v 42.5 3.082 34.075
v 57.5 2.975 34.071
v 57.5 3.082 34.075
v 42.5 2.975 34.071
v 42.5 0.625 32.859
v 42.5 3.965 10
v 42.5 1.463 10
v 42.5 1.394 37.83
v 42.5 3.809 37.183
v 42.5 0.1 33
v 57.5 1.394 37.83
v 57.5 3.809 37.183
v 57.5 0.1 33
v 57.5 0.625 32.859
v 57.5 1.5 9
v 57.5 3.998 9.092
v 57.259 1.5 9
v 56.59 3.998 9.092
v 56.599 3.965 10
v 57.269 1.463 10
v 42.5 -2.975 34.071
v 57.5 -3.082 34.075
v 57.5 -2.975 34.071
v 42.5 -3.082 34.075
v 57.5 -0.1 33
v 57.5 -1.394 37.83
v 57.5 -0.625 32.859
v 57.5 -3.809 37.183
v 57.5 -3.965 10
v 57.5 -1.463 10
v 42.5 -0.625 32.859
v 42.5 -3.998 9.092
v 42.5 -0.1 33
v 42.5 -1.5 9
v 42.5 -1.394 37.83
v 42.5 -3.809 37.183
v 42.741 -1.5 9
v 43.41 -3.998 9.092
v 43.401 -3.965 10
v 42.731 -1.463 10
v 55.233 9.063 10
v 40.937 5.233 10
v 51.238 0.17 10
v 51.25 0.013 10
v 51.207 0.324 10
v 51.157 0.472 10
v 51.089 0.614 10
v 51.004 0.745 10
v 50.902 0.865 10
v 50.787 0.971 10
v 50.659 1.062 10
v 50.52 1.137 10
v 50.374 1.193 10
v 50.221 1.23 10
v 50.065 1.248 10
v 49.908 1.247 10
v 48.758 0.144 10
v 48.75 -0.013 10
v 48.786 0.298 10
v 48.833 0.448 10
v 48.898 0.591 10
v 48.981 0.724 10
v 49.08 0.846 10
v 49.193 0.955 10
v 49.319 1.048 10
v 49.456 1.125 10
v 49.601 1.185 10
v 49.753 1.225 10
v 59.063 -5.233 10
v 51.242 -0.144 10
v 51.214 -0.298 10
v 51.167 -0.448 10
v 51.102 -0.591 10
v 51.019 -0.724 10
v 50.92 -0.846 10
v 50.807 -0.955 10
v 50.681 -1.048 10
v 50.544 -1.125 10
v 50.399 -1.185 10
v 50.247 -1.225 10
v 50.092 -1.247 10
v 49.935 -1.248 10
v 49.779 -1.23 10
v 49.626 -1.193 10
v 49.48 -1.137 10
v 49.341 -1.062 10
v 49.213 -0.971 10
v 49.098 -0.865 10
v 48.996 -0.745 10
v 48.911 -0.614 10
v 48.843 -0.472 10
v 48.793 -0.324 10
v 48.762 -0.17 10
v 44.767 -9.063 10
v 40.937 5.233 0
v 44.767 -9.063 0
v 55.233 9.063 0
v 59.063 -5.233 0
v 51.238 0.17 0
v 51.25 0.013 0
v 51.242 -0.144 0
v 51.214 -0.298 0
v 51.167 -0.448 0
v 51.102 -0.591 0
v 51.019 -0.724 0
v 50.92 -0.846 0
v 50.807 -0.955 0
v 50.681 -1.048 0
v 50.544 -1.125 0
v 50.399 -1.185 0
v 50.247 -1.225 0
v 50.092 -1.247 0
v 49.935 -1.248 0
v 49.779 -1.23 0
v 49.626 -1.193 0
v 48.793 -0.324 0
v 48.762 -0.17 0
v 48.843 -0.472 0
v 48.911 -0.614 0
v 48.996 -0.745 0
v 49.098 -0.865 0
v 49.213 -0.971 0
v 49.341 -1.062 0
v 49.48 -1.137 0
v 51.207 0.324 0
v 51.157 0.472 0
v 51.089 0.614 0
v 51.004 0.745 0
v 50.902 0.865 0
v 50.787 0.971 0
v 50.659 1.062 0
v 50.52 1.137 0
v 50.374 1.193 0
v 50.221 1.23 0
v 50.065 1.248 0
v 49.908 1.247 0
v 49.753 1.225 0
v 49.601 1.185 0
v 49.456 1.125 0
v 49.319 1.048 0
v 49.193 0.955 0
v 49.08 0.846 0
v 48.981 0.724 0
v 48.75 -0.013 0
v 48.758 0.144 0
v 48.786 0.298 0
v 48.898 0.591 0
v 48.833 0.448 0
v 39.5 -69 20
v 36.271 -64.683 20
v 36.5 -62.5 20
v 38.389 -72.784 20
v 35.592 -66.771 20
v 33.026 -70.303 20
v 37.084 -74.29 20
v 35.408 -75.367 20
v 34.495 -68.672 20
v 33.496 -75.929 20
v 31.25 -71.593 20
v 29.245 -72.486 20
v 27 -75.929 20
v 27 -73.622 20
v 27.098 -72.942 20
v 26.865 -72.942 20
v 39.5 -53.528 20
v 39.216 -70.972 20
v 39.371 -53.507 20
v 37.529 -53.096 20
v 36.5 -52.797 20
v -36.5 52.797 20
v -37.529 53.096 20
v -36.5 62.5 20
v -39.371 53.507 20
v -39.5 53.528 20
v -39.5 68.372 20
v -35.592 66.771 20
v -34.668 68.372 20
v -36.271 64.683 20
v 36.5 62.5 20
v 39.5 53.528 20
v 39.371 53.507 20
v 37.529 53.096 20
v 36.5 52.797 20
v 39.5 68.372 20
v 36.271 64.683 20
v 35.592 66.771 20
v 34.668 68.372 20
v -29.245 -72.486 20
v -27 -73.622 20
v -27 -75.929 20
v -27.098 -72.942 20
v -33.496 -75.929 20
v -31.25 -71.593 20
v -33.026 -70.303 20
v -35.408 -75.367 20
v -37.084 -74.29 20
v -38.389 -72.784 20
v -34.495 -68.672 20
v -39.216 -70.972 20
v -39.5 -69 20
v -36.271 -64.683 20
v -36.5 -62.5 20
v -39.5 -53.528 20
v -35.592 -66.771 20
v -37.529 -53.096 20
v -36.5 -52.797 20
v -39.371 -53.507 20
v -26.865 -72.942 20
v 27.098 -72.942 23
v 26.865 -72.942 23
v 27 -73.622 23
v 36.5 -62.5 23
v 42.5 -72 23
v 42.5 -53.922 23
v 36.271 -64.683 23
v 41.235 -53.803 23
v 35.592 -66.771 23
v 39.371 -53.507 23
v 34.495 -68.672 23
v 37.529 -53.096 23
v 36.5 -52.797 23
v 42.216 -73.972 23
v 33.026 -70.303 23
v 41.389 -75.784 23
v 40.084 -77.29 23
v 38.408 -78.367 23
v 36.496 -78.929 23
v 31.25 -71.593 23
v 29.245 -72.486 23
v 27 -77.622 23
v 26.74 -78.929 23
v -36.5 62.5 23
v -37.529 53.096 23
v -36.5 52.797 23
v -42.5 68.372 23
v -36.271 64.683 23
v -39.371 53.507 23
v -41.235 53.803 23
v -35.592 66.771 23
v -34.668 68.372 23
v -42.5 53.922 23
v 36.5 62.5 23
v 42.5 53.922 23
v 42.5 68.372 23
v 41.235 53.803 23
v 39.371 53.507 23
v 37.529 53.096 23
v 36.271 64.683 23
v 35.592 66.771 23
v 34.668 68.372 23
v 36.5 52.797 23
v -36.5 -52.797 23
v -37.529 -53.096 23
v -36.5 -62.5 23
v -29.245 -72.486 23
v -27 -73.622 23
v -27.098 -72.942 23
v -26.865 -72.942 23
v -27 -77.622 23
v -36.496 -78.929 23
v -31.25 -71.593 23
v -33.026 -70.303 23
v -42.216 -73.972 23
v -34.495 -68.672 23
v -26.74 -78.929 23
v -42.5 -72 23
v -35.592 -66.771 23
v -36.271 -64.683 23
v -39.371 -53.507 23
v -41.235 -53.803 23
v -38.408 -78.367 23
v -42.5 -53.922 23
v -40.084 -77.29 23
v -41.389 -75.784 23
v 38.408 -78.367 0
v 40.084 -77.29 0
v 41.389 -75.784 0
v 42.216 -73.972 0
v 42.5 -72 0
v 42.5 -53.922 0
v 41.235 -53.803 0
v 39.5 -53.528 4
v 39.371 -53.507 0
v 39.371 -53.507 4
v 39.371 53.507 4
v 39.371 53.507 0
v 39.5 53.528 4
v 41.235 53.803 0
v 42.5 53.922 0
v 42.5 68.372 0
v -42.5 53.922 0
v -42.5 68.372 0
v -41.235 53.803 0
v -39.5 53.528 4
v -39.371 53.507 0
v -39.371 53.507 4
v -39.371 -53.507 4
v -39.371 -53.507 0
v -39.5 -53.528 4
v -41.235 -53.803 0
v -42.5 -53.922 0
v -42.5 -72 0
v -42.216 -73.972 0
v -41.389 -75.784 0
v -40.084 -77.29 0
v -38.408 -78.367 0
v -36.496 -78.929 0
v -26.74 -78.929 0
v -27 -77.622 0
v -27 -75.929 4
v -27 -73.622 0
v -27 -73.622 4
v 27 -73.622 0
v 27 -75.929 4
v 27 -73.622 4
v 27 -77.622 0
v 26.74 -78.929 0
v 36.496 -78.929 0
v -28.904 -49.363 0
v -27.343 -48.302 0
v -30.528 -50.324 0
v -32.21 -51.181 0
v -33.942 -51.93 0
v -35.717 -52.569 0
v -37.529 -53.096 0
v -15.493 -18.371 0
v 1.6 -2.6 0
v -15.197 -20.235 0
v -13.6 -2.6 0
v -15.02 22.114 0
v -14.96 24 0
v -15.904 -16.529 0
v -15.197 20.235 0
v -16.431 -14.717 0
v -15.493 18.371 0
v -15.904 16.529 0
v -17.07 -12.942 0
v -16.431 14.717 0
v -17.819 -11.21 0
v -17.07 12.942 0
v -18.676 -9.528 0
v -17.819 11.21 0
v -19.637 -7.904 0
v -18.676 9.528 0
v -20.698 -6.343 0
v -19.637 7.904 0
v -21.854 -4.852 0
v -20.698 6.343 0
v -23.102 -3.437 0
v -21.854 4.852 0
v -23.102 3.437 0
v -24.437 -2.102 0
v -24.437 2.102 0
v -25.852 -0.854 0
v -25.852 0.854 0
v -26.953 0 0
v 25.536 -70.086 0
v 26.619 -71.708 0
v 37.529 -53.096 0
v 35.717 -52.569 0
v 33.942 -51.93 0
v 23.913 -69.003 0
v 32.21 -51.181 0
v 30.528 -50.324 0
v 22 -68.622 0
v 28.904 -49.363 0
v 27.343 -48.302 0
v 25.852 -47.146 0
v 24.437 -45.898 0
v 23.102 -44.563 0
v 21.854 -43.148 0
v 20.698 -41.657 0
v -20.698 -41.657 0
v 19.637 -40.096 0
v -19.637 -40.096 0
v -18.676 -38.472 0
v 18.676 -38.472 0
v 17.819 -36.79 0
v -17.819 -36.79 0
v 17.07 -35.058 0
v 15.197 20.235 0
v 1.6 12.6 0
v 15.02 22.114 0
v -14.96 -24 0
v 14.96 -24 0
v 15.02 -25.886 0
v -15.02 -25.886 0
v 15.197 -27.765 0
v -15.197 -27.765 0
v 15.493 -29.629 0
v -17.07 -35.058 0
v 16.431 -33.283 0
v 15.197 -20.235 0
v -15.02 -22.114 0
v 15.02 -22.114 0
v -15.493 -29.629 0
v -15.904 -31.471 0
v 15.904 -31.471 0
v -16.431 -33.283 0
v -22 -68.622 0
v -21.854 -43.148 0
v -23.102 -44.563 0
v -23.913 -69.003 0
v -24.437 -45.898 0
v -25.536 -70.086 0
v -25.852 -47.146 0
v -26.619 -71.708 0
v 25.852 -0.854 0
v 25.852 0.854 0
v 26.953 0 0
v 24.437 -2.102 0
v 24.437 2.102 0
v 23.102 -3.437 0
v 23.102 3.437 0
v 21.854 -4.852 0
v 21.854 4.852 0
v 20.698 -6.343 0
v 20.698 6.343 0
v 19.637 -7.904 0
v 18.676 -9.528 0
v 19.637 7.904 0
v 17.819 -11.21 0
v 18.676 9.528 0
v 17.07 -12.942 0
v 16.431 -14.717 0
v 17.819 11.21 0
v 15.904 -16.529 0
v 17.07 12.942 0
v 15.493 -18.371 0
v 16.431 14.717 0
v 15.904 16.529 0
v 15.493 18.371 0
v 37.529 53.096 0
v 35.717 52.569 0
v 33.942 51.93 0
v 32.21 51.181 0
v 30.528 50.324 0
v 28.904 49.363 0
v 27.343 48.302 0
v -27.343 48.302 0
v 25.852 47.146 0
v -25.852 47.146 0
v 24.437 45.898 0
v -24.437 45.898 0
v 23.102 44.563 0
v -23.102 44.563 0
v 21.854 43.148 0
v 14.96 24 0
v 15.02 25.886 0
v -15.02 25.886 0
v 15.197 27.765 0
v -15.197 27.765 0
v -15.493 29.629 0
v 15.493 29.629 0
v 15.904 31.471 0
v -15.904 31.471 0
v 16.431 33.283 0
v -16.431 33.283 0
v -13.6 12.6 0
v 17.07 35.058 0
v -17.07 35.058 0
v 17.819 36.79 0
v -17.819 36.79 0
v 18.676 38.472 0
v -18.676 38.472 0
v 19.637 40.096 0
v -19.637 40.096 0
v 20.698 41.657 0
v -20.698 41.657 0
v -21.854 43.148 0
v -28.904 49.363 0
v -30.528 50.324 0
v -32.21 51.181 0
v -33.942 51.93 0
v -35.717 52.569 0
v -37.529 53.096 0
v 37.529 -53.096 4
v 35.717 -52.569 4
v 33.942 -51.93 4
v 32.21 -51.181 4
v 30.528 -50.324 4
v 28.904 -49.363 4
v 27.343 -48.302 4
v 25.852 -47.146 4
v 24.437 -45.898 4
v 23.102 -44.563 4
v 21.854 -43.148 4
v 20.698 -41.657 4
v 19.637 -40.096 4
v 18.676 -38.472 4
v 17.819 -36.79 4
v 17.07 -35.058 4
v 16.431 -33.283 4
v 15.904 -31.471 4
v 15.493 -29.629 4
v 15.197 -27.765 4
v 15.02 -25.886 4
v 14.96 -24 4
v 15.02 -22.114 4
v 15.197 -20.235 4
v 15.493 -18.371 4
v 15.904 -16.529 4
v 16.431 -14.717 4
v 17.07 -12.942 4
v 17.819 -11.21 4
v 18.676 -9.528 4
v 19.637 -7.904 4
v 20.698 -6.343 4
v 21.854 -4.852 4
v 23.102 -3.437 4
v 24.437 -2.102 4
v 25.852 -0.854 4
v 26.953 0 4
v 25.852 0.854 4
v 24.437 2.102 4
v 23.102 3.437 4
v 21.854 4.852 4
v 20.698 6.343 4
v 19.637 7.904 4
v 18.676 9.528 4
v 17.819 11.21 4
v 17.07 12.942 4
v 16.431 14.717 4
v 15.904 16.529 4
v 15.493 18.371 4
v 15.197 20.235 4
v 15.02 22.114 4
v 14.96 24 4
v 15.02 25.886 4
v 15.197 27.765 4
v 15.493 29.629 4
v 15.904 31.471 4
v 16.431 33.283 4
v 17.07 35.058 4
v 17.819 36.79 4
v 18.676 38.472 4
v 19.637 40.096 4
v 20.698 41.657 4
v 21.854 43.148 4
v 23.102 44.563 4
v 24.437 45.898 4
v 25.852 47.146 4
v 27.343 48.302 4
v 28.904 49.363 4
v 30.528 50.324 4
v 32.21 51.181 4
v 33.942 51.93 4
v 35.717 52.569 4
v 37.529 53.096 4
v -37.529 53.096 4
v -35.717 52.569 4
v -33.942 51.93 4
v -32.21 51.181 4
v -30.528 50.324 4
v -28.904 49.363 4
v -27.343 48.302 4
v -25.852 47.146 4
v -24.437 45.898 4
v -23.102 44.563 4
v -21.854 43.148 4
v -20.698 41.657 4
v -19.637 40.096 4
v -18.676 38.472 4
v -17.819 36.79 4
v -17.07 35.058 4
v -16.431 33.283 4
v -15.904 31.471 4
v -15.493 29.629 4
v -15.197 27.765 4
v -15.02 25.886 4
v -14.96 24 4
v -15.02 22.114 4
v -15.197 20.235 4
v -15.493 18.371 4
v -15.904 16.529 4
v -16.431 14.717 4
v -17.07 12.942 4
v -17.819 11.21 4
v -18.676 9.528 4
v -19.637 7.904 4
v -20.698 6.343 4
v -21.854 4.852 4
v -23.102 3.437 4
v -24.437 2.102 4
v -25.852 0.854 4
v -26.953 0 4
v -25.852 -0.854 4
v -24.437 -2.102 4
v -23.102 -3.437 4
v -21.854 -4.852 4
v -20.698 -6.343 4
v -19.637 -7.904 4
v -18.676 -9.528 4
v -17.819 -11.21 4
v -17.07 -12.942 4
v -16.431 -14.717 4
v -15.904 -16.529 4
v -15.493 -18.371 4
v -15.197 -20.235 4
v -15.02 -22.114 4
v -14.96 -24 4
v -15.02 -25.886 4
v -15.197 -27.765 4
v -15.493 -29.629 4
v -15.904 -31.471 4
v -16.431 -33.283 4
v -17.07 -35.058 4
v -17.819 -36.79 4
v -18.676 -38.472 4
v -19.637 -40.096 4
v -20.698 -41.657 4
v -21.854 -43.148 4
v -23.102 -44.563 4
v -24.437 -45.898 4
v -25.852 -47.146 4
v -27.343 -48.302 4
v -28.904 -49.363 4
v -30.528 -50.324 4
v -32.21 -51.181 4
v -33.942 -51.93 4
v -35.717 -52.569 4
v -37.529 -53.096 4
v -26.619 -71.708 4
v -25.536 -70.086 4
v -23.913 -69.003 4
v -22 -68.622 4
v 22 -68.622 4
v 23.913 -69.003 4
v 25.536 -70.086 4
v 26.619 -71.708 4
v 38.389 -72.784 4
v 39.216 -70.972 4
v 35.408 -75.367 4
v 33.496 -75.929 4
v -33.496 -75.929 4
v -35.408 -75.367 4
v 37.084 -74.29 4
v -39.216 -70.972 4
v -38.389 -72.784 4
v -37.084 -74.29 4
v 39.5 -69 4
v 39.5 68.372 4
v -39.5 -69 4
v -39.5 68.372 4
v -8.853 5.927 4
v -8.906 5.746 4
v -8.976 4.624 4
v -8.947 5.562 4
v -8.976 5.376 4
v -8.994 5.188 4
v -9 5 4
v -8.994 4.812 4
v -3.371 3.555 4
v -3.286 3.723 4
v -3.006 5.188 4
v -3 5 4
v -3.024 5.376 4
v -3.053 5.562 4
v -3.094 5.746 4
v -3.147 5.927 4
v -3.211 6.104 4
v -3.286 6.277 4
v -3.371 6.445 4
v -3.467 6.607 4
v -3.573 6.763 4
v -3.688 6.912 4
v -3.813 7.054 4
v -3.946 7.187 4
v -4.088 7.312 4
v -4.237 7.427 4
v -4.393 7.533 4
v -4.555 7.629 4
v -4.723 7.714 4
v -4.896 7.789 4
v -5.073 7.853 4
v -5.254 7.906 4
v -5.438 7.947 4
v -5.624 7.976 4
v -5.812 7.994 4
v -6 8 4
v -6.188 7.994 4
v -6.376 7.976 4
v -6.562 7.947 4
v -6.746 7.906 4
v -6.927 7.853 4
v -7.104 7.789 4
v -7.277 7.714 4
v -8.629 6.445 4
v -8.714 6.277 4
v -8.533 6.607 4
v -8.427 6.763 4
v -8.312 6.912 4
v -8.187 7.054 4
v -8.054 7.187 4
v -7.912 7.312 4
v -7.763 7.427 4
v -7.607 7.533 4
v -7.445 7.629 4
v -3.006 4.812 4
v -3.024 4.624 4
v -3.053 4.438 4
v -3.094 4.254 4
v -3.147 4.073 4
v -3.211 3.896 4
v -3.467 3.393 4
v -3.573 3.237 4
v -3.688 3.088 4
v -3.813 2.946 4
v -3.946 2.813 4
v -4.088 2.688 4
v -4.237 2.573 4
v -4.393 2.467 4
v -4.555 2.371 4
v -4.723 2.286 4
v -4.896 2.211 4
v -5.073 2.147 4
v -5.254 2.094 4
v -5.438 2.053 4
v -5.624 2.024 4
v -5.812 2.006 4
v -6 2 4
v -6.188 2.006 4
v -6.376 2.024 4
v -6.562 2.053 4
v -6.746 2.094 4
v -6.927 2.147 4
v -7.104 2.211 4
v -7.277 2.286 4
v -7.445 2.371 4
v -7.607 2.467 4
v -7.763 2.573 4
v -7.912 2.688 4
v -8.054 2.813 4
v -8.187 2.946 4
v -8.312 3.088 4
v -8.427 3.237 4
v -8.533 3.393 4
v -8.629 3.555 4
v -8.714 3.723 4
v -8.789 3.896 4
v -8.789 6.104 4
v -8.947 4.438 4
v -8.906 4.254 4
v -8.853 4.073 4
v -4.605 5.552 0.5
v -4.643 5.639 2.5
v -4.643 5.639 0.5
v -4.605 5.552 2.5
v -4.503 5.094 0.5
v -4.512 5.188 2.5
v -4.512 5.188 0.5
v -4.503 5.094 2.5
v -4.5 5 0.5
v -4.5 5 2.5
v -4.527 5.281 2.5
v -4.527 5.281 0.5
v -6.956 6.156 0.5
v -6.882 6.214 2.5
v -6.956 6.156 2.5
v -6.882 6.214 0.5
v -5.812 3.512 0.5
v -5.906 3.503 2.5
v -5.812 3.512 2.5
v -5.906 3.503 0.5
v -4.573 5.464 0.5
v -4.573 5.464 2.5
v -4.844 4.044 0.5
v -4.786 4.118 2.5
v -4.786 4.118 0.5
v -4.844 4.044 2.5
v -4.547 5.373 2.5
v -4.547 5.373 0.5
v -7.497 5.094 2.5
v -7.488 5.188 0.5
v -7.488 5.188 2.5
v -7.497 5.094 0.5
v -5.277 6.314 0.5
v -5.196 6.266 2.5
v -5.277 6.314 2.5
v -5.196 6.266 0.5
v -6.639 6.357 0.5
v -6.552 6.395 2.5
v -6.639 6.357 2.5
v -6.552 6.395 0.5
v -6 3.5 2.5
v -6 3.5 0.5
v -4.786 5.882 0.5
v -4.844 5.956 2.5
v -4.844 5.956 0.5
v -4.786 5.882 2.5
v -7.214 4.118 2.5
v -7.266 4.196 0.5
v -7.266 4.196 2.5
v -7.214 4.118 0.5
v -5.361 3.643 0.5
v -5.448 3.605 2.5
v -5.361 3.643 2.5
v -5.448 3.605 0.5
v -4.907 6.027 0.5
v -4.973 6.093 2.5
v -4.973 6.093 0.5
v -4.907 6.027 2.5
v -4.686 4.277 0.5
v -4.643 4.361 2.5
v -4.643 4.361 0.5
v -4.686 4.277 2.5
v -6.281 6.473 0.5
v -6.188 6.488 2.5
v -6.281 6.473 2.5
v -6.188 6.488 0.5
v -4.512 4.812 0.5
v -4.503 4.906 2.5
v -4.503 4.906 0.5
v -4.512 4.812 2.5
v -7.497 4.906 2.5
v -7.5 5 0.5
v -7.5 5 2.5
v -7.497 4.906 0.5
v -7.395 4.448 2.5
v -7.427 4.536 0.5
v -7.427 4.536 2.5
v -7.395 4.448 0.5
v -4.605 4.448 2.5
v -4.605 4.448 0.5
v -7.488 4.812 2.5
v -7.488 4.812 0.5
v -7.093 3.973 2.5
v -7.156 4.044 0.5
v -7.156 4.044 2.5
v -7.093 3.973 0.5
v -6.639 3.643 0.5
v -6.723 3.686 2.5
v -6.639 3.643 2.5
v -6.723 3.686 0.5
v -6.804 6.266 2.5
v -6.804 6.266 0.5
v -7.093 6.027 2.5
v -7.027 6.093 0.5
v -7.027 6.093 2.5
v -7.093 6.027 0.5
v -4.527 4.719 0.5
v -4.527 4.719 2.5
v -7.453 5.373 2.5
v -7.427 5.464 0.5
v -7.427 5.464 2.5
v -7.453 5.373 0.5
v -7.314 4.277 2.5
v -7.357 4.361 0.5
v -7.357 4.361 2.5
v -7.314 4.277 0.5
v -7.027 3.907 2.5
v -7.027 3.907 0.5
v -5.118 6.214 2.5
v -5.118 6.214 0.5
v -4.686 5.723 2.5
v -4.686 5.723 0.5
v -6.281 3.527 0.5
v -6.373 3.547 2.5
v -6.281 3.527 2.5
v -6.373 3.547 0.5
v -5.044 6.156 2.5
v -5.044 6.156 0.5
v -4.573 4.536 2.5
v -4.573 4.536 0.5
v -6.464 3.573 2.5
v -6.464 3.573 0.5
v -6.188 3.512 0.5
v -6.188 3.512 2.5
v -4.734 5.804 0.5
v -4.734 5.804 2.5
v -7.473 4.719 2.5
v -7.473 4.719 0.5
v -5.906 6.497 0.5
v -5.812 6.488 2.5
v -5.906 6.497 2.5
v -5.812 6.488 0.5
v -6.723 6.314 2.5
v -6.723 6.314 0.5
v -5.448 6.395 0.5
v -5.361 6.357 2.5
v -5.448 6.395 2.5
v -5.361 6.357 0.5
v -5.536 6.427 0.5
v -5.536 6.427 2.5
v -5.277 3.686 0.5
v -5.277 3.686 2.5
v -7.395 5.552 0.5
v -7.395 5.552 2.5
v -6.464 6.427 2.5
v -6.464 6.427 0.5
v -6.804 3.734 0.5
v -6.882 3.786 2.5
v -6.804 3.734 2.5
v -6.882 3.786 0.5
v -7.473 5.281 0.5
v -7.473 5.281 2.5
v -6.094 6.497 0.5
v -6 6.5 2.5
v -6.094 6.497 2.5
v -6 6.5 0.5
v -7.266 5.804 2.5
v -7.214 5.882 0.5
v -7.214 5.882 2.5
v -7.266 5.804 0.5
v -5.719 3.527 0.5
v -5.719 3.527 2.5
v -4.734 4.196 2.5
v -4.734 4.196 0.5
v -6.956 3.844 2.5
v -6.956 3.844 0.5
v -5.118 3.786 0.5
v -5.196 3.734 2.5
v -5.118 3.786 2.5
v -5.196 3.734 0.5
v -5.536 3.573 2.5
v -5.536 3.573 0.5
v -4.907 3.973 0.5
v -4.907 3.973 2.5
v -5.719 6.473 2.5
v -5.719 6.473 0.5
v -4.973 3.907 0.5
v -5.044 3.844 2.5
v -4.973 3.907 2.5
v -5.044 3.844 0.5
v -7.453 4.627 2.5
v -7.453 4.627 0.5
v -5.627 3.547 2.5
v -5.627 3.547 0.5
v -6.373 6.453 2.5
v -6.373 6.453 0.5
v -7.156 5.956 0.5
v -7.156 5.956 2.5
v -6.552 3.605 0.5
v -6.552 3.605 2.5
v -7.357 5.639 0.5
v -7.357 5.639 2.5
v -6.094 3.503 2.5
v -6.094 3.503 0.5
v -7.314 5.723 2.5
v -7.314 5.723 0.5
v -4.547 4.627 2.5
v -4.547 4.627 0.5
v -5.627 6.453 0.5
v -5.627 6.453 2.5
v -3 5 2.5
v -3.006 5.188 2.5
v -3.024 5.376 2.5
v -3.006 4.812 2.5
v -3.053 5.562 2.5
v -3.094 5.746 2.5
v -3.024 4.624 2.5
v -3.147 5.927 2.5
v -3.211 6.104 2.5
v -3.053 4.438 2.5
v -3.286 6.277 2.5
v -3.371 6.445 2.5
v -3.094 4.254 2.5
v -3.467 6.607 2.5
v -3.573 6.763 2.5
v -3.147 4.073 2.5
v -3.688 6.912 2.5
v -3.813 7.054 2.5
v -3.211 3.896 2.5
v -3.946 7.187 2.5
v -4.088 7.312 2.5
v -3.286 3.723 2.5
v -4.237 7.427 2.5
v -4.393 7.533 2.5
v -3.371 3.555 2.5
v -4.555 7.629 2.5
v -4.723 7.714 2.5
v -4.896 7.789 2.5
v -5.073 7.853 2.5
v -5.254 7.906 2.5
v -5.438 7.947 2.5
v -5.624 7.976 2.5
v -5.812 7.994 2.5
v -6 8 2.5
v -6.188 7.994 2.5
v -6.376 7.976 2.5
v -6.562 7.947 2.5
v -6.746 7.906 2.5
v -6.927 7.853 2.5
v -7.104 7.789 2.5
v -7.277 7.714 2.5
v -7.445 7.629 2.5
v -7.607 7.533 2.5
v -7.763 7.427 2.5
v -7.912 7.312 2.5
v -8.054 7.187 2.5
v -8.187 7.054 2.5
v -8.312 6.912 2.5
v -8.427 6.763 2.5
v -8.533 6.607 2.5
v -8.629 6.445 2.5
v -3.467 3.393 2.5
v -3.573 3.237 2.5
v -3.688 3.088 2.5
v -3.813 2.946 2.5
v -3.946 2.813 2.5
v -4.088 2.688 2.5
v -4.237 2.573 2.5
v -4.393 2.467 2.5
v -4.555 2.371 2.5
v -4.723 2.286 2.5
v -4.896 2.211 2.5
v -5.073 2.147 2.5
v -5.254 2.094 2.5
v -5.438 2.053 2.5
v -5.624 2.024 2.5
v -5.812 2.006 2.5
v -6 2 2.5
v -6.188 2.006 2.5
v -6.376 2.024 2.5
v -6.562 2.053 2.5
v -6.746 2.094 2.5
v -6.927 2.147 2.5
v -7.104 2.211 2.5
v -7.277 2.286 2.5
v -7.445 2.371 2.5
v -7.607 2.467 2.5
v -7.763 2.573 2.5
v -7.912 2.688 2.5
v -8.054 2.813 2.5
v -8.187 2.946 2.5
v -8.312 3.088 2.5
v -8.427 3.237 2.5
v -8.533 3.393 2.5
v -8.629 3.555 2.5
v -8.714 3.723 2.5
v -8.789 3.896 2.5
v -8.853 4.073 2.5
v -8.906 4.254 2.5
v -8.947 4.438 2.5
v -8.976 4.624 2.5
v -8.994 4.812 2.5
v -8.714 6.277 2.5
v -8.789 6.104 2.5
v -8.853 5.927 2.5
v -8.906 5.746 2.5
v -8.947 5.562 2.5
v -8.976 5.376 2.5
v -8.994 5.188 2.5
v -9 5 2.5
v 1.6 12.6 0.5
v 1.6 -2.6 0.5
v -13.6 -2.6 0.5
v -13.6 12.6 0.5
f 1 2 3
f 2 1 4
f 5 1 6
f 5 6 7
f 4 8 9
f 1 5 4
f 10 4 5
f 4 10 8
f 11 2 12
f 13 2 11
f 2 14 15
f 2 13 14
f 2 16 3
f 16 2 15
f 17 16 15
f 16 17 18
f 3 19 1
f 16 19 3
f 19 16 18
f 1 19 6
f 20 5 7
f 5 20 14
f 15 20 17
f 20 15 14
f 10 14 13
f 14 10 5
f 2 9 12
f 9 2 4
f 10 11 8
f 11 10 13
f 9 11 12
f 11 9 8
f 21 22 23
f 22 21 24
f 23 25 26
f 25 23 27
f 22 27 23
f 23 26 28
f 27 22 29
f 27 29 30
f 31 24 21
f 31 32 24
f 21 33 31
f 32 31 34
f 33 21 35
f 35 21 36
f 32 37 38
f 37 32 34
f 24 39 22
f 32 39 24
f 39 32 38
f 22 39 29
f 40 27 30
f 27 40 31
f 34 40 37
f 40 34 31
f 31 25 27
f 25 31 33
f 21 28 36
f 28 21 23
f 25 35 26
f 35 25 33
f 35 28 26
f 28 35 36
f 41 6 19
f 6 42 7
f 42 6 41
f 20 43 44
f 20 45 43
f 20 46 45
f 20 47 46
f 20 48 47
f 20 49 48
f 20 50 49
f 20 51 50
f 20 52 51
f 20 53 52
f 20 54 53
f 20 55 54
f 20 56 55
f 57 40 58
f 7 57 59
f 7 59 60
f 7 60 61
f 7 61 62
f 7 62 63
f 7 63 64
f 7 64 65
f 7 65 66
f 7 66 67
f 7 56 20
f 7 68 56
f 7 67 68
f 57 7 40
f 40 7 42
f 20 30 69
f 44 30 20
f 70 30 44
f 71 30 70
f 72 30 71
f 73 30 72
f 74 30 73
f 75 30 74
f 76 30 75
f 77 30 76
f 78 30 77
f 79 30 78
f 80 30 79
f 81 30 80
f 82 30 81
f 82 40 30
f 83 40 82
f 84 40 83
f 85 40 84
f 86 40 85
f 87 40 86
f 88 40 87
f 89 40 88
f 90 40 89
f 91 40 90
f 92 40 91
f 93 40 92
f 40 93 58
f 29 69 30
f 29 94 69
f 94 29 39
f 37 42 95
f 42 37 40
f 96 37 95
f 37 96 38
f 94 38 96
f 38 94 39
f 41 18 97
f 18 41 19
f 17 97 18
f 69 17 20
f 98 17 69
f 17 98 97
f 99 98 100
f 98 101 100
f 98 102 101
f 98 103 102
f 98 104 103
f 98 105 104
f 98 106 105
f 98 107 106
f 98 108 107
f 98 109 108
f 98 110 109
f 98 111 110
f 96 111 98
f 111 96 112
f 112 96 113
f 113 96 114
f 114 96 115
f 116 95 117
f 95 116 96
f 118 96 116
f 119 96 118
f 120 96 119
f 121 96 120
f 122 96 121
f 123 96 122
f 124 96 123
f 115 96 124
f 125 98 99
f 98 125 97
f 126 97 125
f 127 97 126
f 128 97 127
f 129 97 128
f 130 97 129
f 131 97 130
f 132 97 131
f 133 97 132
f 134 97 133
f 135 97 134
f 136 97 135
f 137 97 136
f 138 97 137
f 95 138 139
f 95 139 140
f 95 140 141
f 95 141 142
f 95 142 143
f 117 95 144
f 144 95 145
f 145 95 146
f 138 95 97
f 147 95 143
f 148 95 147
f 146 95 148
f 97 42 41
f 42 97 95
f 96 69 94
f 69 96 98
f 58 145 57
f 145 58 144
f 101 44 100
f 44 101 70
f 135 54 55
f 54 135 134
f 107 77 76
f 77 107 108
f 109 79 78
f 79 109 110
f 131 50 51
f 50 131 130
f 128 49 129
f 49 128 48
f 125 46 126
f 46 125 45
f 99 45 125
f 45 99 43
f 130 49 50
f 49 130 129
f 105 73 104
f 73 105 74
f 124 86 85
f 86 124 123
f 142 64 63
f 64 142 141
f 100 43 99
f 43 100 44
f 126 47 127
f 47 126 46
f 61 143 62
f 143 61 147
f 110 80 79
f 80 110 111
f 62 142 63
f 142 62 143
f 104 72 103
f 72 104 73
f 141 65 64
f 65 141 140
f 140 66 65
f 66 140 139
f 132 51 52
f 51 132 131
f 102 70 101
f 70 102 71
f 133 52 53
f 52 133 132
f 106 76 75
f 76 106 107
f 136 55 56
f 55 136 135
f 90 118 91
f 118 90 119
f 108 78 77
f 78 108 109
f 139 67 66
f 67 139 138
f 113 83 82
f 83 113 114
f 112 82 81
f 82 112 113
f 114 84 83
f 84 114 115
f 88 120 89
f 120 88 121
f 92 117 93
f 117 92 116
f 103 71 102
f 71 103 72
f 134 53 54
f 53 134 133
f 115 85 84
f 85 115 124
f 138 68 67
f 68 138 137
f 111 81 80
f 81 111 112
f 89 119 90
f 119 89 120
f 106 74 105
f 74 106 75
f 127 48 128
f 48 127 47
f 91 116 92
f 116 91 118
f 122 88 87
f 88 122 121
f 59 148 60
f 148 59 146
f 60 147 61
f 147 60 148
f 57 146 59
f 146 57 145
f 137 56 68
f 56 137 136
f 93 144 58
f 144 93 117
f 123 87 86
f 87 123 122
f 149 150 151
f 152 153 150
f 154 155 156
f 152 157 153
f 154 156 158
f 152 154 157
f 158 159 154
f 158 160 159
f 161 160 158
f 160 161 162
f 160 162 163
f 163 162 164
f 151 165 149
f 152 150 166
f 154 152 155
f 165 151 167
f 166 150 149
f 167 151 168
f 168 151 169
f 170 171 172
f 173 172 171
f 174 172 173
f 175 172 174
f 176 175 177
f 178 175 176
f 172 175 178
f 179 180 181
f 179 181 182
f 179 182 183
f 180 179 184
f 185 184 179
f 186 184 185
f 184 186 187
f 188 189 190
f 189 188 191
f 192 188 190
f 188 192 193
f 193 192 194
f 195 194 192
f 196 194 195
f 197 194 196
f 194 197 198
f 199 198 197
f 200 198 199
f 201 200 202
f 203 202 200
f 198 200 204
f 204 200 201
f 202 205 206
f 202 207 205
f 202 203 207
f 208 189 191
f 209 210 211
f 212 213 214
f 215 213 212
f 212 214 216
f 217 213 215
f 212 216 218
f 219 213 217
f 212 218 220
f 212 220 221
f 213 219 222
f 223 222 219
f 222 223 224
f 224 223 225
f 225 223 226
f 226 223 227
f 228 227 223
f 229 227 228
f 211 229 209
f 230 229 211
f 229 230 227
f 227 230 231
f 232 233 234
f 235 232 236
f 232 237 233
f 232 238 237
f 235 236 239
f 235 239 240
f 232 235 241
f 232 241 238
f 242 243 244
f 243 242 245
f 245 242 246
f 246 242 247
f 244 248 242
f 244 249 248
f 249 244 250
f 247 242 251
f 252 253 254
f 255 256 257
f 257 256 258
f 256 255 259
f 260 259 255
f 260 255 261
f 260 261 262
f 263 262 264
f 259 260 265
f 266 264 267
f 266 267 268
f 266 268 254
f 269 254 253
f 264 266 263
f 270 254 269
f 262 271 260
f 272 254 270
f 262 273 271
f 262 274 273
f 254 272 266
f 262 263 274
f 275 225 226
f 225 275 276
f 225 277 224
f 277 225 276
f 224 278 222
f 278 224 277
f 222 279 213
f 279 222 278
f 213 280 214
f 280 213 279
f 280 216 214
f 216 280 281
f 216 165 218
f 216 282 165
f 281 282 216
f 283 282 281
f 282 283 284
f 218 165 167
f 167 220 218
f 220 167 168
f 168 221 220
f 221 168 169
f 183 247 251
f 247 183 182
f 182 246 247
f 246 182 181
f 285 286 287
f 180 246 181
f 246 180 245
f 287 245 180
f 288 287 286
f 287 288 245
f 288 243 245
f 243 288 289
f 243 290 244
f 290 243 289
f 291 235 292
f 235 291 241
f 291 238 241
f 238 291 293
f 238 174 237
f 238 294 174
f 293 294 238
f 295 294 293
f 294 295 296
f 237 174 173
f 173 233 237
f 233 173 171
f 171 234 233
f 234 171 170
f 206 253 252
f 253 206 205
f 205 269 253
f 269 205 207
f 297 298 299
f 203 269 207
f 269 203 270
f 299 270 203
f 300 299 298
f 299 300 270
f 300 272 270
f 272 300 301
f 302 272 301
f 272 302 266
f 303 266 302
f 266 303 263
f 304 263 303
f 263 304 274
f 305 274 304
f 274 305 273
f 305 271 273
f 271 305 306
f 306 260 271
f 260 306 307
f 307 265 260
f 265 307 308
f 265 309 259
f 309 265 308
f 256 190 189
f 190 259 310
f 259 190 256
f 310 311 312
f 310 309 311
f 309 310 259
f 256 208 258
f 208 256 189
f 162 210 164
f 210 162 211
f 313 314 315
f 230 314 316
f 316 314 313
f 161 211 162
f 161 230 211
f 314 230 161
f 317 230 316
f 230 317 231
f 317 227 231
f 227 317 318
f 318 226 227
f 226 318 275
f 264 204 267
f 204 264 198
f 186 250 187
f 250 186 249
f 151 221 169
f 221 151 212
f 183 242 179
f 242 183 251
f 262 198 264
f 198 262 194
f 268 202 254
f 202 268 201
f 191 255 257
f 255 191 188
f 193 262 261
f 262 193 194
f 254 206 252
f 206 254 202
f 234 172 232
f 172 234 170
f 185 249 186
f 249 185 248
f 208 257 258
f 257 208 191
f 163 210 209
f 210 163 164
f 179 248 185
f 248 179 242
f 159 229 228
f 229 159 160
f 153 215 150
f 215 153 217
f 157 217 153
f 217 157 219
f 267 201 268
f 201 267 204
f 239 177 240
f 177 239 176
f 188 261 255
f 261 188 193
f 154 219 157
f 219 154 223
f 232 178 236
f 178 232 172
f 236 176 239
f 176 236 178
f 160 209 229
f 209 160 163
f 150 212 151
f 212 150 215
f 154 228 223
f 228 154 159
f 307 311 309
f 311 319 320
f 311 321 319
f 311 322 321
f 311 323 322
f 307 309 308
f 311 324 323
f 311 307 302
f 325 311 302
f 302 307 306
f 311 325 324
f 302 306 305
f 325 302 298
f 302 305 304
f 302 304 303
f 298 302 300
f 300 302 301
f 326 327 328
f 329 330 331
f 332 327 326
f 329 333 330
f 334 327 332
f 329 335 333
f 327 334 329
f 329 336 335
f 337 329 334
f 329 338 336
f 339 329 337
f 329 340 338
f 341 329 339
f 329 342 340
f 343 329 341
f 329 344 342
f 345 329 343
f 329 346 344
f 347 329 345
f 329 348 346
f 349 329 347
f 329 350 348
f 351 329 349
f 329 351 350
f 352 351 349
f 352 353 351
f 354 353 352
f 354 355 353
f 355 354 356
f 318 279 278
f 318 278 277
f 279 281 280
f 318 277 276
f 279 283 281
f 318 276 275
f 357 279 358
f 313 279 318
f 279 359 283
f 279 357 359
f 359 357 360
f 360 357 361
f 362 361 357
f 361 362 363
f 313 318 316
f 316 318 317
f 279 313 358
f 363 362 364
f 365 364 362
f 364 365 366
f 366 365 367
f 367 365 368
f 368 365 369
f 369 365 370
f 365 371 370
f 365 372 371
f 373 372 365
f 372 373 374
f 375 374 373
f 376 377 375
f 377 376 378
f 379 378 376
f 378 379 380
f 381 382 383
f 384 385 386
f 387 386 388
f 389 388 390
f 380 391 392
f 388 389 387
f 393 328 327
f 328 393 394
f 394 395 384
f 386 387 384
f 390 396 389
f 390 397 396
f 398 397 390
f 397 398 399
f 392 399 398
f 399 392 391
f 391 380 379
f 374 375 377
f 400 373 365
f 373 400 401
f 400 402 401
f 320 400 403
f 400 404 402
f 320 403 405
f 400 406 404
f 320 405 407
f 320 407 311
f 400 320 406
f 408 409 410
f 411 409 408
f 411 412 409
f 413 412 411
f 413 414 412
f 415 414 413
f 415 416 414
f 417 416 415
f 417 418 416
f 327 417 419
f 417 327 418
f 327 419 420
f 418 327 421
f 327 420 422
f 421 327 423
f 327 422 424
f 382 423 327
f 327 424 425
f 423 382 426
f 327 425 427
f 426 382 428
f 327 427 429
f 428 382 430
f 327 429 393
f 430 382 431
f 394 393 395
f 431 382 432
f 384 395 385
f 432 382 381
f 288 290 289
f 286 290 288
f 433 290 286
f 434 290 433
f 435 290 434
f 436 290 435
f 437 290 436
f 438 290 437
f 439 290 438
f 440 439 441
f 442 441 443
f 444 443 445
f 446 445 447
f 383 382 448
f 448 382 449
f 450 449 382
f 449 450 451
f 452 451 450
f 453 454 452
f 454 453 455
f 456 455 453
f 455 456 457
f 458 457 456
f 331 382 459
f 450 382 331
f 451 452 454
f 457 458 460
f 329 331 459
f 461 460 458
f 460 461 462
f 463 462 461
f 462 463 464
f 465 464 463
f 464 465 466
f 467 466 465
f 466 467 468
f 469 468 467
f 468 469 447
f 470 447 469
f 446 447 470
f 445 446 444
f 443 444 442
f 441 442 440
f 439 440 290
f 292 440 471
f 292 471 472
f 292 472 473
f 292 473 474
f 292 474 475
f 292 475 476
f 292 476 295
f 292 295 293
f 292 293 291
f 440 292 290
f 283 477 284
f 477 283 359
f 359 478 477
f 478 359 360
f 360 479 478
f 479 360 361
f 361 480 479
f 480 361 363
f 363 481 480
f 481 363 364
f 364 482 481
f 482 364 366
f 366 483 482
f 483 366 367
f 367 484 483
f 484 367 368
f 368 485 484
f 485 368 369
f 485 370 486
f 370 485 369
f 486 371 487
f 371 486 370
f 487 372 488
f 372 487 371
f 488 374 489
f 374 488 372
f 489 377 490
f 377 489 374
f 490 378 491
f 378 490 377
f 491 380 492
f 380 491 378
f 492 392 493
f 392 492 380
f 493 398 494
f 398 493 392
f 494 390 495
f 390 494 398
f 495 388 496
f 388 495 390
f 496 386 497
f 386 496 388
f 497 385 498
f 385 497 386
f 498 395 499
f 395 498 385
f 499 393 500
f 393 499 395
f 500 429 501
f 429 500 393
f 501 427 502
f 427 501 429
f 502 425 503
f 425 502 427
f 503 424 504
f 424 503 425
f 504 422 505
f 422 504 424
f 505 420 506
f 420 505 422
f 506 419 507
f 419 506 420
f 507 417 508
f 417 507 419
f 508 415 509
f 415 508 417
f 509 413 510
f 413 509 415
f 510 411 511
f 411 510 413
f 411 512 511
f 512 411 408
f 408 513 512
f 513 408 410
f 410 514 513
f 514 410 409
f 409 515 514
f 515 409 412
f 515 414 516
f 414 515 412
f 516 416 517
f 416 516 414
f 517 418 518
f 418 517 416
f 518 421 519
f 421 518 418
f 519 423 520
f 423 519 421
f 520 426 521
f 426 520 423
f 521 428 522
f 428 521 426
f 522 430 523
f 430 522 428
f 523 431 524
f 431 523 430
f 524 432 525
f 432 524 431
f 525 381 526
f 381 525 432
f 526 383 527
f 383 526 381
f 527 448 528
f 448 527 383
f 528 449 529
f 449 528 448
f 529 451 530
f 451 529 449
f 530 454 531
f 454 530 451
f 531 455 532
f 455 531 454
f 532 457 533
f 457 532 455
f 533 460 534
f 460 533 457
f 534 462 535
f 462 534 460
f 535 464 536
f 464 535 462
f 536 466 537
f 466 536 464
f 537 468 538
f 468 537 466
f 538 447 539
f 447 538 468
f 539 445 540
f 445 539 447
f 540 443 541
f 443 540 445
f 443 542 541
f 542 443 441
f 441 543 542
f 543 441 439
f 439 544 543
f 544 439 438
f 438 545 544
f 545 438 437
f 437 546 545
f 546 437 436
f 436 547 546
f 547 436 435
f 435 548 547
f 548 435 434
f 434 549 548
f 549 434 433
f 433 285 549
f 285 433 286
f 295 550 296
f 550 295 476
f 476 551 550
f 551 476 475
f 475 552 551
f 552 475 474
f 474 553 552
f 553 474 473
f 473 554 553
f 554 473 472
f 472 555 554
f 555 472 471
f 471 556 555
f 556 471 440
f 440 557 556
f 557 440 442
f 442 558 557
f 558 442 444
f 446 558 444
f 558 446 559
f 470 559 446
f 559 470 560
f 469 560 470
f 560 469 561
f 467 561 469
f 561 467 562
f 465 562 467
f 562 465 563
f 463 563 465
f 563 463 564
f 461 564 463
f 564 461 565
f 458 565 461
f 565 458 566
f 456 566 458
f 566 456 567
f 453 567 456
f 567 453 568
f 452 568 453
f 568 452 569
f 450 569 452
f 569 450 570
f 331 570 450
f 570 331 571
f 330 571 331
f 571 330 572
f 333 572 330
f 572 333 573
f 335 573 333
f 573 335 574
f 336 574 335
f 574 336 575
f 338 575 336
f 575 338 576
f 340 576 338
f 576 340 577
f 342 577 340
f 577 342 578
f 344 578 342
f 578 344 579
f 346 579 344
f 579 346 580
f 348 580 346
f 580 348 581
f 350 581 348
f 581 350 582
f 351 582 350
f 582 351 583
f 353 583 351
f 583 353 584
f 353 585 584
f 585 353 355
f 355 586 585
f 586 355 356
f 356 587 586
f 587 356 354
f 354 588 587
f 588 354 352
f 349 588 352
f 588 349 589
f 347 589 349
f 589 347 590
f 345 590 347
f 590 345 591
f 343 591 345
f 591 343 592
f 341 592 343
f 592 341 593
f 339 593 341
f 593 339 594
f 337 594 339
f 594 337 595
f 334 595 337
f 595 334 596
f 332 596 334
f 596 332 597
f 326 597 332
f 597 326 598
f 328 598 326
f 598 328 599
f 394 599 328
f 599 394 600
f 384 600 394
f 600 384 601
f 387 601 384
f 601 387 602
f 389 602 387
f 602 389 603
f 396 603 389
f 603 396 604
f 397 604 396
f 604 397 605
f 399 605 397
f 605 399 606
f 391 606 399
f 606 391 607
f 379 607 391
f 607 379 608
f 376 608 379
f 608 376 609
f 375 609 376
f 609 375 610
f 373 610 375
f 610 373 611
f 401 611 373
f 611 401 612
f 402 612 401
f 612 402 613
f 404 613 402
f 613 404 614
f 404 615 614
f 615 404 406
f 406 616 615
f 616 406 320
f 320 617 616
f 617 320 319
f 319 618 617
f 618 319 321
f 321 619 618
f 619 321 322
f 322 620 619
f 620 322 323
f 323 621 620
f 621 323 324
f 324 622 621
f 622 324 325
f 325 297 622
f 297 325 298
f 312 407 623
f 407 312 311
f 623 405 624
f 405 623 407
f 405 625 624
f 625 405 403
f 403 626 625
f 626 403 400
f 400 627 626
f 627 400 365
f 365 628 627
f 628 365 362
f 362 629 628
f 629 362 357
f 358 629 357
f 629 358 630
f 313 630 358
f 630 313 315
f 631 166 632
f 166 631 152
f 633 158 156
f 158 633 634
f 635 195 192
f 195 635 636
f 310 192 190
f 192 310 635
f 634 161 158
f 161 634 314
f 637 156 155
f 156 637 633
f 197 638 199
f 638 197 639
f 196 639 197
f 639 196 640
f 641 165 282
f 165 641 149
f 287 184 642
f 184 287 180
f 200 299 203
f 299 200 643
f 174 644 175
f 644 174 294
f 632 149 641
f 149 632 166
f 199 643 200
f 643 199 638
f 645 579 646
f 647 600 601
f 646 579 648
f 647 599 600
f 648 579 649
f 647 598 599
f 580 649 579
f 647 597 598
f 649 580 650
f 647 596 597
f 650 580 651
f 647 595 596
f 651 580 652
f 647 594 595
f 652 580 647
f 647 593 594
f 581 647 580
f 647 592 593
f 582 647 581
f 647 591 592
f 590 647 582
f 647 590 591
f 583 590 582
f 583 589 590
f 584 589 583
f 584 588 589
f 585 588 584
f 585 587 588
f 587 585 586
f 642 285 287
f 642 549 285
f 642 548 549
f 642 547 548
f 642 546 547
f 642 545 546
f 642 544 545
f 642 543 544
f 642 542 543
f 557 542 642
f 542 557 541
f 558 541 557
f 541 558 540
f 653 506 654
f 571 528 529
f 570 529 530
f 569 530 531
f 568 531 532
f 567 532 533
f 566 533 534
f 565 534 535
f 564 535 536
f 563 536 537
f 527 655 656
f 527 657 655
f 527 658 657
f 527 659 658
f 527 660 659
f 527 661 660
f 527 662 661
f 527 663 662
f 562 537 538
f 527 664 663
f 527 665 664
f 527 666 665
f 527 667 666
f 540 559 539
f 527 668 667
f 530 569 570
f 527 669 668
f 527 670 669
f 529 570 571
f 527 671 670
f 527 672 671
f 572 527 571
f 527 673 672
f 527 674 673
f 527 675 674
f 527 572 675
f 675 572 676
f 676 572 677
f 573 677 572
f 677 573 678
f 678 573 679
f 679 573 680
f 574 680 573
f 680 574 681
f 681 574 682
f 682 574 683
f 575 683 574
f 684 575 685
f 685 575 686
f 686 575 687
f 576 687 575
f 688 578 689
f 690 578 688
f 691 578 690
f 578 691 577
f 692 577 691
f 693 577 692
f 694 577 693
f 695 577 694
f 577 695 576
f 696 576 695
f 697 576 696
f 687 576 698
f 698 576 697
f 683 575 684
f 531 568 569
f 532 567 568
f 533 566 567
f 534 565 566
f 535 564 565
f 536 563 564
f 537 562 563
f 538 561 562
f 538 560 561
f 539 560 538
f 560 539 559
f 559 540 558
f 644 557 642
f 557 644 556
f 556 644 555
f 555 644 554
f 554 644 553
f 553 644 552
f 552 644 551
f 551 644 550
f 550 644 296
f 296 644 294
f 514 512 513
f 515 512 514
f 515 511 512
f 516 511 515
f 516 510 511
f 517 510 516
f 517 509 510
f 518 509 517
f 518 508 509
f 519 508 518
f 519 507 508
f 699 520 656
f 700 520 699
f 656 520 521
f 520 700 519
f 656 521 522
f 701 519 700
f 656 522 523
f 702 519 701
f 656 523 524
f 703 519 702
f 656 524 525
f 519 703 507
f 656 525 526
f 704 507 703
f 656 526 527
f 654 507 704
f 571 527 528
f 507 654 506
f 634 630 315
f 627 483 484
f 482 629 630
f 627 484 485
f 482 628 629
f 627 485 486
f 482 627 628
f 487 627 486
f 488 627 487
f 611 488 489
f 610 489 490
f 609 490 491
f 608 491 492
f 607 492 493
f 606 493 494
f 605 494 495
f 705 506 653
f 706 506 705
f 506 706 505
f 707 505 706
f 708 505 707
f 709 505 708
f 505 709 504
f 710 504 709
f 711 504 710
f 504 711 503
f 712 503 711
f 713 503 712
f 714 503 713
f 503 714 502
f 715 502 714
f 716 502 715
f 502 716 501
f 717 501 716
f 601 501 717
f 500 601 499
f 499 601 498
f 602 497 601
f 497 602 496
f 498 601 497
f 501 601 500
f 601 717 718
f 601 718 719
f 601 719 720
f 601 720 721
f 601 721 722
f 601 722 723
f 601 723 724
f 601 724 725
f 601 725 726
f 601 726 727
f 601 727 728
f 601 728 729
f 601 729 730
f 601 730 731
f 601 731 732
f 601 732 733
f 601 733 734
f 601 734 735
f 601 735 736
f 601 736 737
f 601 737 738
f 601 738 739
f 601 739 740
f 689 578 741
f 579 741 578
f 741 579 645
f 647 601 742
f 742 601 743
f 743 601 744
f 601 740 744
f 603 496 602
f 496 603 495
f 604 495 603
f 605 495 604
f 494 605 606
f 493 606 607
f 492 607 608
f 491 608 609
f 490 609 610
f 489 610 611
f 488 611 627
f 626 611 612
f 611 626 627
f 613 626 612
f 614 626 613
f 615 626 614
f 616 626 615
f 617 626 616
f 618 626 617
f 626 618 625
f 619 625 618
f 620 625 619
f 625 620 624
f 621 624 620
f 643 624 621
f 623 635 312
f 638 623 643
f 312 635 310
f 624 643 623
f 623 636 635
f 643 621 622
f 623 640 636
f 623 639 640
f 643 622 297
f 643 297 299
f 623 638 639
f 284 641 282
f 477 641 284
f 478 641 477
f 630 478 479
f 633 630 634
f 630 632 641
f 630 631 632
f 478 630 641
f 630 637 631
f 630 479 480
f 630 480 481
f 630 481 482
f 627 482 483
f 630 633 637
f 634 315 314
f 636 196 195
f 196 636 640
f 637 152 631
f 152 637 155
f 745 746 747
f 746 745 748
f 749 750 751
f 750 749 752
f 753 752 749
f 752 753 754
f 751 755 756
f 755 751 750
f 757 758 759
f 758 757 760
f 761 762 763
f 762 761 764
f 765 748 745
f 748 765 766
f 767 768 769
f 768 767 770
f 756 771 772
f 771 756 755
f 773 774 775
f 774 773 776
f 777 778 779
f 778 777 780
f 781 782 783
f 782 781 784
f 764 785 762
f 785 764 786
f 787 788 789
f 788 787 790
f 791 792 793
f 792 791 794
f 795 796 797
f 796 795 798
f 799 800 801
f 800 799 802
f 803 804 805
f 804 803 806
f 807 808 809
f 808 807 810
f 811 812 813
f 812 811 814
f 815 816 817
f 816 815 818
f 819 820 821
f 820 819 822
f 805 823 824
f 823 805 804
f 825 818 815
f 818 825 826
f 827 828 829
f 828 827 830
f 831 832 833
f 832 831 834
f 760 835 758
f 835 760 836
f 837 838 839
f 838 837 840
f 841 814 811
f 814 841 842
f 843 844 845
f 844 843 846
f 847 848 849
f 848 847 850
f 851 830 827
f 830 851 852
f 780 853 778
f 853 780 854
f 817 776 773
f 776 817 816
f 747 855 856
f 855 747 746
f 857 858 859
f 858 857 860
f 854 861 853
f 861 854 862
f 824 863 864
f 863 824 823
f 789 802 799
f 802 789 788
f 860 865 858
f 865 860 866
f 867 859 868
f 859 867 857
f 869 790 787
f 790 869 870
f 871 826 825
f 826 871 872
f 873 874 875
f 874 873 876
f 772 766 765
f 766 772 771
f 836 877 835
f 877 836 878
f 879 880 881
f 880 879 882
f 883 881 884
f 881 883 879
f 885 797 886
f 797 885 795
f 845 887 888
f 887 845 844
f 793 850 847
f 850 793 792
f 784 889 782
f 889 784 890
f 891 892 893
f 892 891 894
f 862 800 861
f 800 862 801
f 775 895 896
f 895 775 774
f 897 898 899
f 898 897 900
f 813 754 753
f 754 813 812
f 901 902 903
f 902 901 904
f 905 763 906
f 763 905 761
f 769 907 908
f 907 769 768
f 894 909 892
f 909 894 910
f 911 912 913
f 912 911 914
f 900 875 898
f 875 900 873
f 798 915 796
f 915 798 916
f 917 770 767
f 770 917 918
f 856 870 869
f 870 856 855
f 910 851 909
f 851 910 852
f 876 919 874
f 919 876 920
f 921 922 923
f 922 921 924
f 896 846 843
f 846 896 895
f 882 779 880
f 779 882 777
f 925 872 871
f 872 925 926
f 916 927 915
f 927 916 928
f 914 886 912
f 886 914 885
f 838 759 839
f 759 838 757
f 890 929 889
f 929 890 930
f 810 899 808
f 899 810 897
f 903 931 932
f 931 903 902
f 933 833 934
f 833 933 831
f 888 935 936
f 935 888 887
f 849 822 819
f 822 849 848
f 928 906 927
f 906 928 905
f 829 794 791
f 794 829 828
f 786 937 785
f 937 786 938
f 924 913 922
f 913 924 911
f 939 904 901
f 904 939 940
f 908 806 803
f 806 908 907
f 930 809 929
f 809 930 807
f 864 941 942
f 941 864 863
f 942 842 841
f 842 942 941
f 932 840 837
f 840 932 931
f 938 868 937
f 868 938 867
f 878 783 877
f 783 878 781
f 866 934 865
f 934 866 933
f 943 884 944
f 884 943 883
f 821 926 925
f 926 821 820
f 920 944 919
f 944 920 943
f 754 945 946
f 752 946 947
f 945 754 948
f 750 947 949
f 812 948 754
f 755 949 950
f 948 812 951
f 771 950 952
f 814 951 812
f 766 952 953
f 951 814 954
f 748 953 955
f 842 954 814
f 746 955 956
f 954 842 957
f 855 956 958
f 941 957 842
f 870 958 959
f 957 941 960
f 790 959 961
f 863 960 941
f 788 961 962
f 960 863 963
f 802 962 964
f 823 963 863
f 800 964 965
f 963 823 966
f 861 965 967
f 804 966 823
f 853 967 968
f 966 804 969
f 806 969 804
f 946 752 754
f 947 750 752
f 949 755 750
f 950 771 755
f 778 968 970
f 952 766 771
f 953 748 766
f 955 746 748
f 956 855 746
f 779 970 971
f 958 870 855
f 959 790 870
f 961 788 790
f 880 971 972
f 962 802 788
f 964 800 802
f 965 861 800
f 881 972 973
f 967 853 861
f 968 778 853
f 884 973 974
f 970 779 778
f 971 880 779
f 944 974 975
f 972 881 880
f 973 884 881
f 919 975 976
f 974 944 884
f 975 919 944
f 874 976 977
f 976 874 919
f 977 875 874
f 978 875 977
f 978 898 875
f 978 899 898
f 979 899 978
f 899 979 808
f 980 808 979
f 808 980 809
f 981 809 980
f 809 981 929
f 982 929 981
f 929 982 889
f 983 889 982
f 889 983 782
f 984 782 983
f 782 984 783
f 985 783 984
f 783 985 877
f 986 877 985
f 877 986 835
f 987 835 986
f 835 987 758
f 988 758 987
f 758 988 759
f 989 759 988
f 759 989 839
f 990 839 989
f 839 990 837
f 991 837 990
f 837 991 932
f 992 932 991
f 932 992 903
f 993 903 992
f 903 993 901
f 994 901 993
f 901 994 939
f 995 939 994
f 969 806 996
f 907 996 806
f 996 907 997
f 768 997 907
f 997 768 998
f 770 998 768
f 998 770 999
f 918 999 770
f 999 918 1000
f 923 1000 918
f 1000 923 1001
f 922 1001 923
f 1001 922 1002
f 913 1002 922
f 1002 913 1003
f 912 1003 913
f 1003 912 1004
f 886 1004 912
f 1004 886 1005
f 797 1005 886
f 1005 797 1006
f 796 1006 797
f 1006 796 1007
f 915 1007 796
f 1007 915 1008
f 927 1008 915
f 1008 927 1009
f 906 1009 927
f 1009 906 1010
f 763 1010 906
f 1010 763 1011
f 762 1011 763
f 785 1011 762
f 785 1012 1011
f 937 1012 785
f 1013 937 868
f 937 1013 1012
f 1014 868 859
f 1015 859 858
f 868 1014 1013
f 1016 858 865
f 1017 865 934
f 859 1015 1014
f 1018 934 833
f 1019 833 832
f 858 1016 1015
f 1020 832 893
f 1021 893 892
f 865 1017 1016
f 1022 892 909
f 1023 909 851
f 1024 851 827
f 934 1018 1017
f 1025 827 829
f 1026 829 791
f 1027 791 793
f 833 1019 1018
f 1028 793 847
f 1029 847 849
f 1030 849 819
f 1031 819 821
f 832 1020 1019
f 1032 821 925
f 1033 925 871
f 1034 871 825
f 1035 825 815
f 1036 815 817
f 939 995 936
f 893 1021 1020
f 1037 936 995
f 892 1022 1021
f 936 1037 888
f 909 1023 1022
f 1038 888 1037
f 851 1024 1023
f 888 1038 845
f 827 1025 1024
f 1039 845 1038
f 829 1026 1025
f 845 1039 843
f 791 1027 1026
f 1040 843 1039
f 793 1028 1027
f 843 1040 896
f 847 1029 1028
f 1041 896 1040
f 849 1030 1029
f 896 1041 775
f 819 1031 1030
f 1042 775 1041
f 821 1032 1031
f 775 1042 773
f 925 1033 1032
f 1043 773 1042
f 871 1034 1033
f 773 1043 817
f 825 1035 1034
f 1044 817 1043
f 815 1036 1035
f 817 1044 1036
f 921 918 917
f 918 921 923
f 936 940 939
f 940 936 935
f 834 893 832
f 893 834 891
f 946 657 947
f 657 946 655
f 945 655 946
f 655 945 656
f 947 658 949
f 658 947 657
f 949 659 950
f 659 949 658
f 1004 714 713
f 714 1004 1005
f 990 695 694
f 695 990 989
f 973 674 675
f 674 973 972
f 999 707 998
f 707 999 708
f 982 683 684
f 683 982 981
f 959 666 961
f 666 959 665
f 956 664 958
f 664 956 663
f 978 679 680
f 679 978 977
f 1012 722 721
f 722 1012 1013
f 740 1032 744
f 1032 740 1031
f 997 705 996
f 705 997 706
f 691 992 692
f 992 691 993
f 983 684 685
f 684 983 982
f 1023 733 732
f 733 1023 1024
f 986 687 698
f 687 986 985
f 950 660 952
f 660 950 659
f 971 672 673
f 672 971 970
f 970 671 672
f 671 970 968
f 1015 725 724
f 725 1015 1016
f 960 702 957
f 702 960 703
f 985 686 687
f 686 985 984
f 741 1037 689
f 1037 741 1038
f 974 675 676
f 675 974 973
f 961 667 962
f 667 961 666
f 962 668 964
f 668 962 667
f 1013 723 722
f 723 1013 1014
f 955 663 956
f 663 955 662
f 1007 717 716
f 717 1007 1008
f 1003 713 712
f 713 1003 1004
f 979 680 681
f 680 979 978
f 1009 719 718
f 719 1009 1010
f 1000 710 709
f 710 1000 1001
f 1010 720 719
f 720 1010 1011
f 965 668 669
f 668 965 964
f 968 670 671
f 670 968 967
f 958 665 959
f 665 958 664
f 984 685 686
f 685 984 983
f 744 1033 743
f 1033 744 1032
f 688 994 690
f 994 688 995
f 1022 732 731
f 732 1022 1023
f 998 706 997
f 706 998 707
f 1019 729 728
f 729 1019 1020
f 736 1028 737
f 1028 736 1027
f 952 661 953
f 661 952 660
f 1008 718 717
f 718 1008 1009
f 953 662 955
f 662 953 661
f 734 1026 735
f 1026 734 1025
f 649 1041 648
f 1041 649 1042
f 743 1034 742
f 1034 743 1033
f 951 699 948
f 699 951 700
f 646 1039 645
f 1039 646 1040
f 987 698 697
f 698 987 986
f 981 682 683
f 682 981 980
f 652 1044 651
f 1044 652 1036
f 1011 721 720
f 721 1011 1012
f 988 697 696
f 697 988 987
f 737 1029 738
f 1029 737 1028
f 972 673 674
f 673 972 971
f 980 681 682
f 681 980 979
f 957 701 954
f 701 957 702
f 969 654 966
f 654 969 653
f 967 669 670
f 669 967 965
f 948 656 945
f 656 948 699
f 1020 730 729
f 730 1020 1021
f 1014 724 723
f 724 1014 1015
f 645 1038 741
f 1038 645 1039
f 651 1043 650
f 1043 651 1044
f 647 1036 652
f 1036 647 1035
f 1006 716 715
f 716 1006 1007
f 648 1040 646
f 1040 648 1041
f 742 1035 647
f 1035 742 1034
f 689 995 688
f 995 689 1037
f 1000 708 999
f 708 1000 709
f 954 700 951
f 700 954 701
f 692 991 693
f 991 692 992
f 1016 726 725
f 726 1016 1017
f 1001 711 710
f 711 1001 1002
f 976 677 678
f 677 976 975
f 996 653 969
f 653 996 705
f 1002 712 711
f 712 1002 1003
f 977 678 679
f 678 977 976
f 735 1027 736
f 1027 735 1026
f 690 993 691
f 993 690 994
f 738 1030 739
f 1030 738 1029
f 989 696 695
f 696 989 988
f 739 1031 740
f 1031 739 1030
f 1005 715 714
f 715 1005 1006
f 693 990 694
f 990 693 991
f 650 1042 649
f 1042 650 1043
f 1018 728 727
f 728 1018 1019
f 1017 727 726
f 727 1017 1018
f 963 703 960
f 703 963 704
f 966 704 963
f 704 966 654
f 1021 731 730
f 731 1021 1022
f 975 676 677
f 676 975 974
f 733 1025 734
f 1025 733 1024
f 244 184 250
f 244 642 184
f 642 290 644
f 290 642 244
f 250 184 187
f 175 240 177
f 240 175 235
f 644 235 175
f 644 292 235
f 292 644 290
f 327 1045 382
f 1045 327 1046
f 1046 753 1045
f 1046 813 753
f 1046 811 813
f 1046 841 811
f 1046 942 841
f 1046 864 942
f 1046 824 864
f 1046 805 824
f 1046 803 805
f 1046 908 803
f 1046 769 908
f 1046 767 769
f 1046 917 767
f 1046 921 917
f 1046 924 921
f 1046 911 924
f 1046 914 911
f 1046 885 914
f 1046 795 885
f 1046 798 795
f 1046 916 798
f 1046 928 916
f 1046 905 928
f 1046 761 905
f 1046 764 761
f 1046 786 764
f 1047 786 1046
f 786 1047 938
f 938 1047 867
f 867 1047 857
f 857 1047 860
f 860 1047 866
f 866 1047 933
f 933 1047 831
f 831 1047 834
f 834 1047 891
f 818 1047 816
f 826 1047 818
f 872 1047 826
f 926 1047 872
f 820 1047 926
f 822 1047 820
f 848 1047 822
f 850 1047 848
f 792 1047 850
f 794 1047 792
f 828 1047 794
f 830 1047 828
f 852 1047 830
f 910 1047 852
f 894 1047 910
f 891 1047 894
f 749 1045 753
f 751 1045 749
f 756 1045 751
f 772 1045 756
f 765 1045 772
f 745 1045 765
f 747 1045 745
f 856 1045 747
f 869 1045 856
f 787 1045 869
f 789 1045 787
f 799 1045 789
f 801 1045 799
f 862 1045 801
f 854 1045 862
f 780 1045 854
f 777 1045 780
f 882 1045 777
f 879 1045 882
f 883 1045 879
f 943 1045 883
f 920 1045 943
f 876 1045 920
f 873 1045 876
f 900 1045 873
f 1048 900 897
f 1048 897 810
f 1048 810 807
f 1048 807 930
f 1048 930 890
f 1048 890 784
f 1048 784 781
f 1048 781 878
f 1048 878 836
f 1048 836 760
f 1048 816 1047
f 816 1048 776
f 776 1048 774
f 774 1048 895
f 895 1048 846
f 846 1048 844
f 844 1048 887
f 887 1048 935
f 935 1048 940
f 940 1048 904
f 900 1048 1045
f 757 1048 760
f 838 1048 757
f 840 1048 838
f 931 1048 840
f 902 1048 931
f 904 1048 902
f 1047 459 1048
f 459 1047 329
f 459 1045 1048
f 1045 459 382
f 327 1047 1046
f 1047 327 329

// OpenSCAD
//Rev.1 made clip recess wider for better fit

display_clip=1;
display_holder=1;
clip_angle=15;


//Large: width 75 to 80 mm
//Maximum thickness 14 mm
// Minimum height 140mm
w=75+4;
l=152;  
d=8+2; 
/*
//Small:width 70 to 74 mm
//Maximum thickness 12 mm
// Minimum height 120mm
w=75;
l=132;  
d=8;
*/

//-------------------------------
back_thk=4;
shell_thk=3;
clearance=3;  //phone thickness clearance
r=7; //corner rounding radius

speaker_y= l/2.01; //75.5; //from center of phone

sr=0;//150; //phone bottom side rounding radius, 0=no rounding 150
br=0;//220; //phone bottom  top rounding radius, 0=no rounding 0
//end of phone definition

case_height=d+shell_thk+back_thk+clearance;  

 module round_square(w=75,l=152,r=7){
  minkowski() {
    square([w-2*r,l-2*r],center=true);
    circle(r); 
}}

module right_cutout(){
    d=l/2.53; w=l/2.53;
 y1=12;x1=45;
 
  translate([x1,y1*2,0])
     resize([d,w])circle(d,$fn=100); //side
     translate([x1,-y1*2,0])
     resize([d,w])circle(d,$fn=100); 
}
 
module 2d_base(){
 thk=shell_thk; //shell thickness
 difference(){
 round_square(w=w+2*thk,l=l+2*thk,r=r);
 //square([160,90],center=true);
     right_cutout();
     mirror([1,0,0]) right_cutout();
     translate([0,-speaker_y,0])  round_square(w=54,l=14,r=5); //speaker
 
    }
    }
    
 //phone dim, height add clearance
    module letv622(height=d+2*clearance){
   intersection(){
    translate([0,0,0]) linear_extrude(height) round_square(w,l,r);
       if (sr!=0){
   translate([0,0,147.3]) rotate([90,0,0])  cylinder(r=sr,h=260, $fn=100, center=true);  //side rounding
       }
       if (br!=0){
    translate([0,0,208]) rotate([0,90,0])  cylinder(r=br,h=260, $fn=100, center=true); //top and bottom rounding
       }
   }
   }
   
   
   module shellbase(height=case_height){
   difference(){
      linear_extrude(height)2d_base(); 
      translate([0,0,back_thk])  letv622();
       }
   }

module rim(){
       thk=shell_thk;
   rim=6;
   difference(){
        linear_extrude(height=thk)2d_base();
         linear_extrude(height=thk)
   round_square(w=w-rim,l=l-rim,r=10.5);
   }
   }
   
   module phone_case(){
 difference(){
union(){
  translate([0,0,case_height]) rim();
   intersection(){
   shellbase(height=case_height);
    if (sr!=0){   
  translate([0,0,147.3-1]) rotate([90,0,0])   cylinder(r=sr,h=260, $fn=100, center=true);  //sides rounding
    }
    if (br!=0){
     translate([0,0,208-1]) rotate([0,90,0])   cylinder(r=br,h=260, $fn=100, center=true);  //top and bottom rounding
   }} }
}
}
module step_cylinder(od1=25,od2=20,len1=2,len2=5){
cylinder(r=od1/2,h=len1, $fn=100); 
translate([0,0,len1]) cylinder(r=od2/2,h=len2, $fn=100); 
}

module squareBase(){
difference(){
translate([0,0,7.5])
cube([10,14.8,14.8], center=true);
//cylinder(5,10,5)
    translate([-8,0,7.5])
    rotate([0,90,0]) cylinder(r=1.25,h=15,$fn=50); 
}

}

module Lclip(){
    union(){
translate([4,1.5,0])
  rotate([0,0,-2.1]) cube([25,2.5,15]);
translate([28,0.1,0])
  rotate([0,0,15]) cube([5,2.5,15]);
    }
} 

module clips(){
Lclip();
translate([0,0,15])
rotate([180,0,0]) Lclip();
}

module ventClip(){
union(){
translate([7.5,0,0]) rotate([0,-90,0]) clips();
rotate([0,0,clip_angle]) translate([7.5,0,0]) rotate([0,-90,0]) squareBase();}
}

if (display_clip==1){
translate([50,0,5]) rotate([0,0,0])
ventClip();
}


if (display_holder==1){
difference(){
phone_case();
translate([0,l/1.72,3]) rotate([0,0,0]) cube([100,40,40],center=true);
    translate([-6,5,-.5]) rotate([0,0,0]) cube([15.2,15.2,2],center=true);
translate([-6,5,-.5]) step_cylinder(od1=3,od2=6,len1=3,len2=2);
}
} 


//translate([0,l/2-5,11]) cube([77.24,10,12.50],center=true);  //large demension check
//translate([0,l/2-5,11]) cube([74,10,12.50],center=true);  //small demension check

//rim();

 
